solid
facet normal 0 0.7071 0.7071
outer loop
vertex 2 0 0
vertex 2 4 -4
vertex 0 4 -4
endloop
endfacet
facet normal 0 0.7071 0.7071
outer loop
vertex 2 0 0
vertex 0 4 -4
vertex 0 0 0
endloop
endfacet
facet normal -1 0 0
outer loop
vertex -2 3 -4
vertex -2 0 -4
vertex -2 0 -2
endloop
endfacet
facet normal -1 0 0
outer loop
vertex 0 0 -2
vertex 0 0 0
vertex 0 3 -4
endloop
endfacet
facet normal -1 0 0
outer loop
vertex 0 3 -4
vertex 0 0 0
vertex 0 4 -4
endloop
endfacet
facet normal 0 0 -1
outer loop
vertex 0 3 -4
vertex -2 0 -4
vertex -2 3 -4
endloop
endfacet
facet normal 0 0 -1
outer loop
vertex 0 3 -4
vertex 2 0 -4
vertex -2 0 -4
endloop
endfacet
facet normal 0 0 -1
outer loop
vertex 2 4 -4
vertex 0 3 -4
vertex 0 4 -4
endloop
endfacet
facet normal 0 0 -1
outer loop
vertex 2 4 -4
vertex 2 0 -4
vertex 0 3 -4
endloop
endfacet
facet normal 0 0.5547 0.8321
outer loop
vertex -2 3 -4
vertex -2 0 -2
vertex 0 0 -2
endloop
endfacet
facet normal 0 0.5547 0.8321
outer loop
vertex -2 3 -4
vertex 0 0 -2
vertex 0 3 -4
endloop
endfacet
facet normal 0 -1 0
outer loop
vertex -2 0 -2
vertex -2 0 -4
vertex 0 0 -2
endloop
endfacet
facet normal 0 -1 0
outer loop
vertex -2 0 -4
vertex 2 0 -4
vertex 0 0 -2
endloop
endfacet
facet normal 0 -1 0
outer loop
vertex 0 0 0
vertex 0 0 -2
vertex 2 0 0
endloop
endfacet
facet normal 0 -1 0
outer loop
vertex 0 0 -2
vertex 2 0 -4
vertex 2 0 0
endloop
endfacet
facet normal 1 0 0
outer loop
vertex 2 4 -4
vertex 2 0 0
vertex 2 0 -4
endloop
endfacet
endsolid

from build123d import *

# Parameters (mm, degrees)
SKETCH1_W           = 4
SKETCH1_H           = 4
BOSS_EXTRUDE1_DEPTH = 2
SKETCH2_W           = 2
SKETCH2_H           = 3
BOSS_EXTRUDE2_DEPTH = 2
CUT_EXTRUDE1_DEPTH  = 2
CUT_EXTRUDE2_DEPTH  = 2


with BuildPart() as part:
    # Sketch1 → Boss-Extrude1 (new body)
    with BuildSketch(Plane(origin=(0, 0, 0), x_dir=(0, 0, -1), z_dir=(1, 0, 0))):
        with Locations((2, 2)):
            Rectangle(SKETCH1_W, SKETCH1_H)
    extrude(amount=BOSS_EXTRUDE1_DEPTH)

    # Sketch2 → Boss-Extrude2 (add)
    with BuildSketch(Plane.ZY):
        with Locations((-3, 1.5)):
            Rectangle(SKETCH2_W, SKETCH2_H)
    extrude(amount=BOSS_EXTRUDE2_DEPTH)

    # Sketch3 → Cut-Extrude1 (cut)
    with BuildSketch(Plane.ZY.offset(2)):
        Polygon((-4, 3), (-2, 3), (-2, 0), align=None)
    extrude(amount=-CUT_EXTRUDE1_DEPTH, mode=Mode.SUBTRACT)

    # Sketch4 → Cut-Extrude2 (cut)
    with BuildSketch(Plane(origin=(2, 0, 0), x_dir=(0, 0, -1), z_dir=(1, 0, 0))):
        Polygon((4, 4), (0, 0), (0, 4), align=None)
    extrude(amount=-CUT_EXTRUDE2_DEPTH, mode=Mode.SUBTRACT)


solid = part.part
